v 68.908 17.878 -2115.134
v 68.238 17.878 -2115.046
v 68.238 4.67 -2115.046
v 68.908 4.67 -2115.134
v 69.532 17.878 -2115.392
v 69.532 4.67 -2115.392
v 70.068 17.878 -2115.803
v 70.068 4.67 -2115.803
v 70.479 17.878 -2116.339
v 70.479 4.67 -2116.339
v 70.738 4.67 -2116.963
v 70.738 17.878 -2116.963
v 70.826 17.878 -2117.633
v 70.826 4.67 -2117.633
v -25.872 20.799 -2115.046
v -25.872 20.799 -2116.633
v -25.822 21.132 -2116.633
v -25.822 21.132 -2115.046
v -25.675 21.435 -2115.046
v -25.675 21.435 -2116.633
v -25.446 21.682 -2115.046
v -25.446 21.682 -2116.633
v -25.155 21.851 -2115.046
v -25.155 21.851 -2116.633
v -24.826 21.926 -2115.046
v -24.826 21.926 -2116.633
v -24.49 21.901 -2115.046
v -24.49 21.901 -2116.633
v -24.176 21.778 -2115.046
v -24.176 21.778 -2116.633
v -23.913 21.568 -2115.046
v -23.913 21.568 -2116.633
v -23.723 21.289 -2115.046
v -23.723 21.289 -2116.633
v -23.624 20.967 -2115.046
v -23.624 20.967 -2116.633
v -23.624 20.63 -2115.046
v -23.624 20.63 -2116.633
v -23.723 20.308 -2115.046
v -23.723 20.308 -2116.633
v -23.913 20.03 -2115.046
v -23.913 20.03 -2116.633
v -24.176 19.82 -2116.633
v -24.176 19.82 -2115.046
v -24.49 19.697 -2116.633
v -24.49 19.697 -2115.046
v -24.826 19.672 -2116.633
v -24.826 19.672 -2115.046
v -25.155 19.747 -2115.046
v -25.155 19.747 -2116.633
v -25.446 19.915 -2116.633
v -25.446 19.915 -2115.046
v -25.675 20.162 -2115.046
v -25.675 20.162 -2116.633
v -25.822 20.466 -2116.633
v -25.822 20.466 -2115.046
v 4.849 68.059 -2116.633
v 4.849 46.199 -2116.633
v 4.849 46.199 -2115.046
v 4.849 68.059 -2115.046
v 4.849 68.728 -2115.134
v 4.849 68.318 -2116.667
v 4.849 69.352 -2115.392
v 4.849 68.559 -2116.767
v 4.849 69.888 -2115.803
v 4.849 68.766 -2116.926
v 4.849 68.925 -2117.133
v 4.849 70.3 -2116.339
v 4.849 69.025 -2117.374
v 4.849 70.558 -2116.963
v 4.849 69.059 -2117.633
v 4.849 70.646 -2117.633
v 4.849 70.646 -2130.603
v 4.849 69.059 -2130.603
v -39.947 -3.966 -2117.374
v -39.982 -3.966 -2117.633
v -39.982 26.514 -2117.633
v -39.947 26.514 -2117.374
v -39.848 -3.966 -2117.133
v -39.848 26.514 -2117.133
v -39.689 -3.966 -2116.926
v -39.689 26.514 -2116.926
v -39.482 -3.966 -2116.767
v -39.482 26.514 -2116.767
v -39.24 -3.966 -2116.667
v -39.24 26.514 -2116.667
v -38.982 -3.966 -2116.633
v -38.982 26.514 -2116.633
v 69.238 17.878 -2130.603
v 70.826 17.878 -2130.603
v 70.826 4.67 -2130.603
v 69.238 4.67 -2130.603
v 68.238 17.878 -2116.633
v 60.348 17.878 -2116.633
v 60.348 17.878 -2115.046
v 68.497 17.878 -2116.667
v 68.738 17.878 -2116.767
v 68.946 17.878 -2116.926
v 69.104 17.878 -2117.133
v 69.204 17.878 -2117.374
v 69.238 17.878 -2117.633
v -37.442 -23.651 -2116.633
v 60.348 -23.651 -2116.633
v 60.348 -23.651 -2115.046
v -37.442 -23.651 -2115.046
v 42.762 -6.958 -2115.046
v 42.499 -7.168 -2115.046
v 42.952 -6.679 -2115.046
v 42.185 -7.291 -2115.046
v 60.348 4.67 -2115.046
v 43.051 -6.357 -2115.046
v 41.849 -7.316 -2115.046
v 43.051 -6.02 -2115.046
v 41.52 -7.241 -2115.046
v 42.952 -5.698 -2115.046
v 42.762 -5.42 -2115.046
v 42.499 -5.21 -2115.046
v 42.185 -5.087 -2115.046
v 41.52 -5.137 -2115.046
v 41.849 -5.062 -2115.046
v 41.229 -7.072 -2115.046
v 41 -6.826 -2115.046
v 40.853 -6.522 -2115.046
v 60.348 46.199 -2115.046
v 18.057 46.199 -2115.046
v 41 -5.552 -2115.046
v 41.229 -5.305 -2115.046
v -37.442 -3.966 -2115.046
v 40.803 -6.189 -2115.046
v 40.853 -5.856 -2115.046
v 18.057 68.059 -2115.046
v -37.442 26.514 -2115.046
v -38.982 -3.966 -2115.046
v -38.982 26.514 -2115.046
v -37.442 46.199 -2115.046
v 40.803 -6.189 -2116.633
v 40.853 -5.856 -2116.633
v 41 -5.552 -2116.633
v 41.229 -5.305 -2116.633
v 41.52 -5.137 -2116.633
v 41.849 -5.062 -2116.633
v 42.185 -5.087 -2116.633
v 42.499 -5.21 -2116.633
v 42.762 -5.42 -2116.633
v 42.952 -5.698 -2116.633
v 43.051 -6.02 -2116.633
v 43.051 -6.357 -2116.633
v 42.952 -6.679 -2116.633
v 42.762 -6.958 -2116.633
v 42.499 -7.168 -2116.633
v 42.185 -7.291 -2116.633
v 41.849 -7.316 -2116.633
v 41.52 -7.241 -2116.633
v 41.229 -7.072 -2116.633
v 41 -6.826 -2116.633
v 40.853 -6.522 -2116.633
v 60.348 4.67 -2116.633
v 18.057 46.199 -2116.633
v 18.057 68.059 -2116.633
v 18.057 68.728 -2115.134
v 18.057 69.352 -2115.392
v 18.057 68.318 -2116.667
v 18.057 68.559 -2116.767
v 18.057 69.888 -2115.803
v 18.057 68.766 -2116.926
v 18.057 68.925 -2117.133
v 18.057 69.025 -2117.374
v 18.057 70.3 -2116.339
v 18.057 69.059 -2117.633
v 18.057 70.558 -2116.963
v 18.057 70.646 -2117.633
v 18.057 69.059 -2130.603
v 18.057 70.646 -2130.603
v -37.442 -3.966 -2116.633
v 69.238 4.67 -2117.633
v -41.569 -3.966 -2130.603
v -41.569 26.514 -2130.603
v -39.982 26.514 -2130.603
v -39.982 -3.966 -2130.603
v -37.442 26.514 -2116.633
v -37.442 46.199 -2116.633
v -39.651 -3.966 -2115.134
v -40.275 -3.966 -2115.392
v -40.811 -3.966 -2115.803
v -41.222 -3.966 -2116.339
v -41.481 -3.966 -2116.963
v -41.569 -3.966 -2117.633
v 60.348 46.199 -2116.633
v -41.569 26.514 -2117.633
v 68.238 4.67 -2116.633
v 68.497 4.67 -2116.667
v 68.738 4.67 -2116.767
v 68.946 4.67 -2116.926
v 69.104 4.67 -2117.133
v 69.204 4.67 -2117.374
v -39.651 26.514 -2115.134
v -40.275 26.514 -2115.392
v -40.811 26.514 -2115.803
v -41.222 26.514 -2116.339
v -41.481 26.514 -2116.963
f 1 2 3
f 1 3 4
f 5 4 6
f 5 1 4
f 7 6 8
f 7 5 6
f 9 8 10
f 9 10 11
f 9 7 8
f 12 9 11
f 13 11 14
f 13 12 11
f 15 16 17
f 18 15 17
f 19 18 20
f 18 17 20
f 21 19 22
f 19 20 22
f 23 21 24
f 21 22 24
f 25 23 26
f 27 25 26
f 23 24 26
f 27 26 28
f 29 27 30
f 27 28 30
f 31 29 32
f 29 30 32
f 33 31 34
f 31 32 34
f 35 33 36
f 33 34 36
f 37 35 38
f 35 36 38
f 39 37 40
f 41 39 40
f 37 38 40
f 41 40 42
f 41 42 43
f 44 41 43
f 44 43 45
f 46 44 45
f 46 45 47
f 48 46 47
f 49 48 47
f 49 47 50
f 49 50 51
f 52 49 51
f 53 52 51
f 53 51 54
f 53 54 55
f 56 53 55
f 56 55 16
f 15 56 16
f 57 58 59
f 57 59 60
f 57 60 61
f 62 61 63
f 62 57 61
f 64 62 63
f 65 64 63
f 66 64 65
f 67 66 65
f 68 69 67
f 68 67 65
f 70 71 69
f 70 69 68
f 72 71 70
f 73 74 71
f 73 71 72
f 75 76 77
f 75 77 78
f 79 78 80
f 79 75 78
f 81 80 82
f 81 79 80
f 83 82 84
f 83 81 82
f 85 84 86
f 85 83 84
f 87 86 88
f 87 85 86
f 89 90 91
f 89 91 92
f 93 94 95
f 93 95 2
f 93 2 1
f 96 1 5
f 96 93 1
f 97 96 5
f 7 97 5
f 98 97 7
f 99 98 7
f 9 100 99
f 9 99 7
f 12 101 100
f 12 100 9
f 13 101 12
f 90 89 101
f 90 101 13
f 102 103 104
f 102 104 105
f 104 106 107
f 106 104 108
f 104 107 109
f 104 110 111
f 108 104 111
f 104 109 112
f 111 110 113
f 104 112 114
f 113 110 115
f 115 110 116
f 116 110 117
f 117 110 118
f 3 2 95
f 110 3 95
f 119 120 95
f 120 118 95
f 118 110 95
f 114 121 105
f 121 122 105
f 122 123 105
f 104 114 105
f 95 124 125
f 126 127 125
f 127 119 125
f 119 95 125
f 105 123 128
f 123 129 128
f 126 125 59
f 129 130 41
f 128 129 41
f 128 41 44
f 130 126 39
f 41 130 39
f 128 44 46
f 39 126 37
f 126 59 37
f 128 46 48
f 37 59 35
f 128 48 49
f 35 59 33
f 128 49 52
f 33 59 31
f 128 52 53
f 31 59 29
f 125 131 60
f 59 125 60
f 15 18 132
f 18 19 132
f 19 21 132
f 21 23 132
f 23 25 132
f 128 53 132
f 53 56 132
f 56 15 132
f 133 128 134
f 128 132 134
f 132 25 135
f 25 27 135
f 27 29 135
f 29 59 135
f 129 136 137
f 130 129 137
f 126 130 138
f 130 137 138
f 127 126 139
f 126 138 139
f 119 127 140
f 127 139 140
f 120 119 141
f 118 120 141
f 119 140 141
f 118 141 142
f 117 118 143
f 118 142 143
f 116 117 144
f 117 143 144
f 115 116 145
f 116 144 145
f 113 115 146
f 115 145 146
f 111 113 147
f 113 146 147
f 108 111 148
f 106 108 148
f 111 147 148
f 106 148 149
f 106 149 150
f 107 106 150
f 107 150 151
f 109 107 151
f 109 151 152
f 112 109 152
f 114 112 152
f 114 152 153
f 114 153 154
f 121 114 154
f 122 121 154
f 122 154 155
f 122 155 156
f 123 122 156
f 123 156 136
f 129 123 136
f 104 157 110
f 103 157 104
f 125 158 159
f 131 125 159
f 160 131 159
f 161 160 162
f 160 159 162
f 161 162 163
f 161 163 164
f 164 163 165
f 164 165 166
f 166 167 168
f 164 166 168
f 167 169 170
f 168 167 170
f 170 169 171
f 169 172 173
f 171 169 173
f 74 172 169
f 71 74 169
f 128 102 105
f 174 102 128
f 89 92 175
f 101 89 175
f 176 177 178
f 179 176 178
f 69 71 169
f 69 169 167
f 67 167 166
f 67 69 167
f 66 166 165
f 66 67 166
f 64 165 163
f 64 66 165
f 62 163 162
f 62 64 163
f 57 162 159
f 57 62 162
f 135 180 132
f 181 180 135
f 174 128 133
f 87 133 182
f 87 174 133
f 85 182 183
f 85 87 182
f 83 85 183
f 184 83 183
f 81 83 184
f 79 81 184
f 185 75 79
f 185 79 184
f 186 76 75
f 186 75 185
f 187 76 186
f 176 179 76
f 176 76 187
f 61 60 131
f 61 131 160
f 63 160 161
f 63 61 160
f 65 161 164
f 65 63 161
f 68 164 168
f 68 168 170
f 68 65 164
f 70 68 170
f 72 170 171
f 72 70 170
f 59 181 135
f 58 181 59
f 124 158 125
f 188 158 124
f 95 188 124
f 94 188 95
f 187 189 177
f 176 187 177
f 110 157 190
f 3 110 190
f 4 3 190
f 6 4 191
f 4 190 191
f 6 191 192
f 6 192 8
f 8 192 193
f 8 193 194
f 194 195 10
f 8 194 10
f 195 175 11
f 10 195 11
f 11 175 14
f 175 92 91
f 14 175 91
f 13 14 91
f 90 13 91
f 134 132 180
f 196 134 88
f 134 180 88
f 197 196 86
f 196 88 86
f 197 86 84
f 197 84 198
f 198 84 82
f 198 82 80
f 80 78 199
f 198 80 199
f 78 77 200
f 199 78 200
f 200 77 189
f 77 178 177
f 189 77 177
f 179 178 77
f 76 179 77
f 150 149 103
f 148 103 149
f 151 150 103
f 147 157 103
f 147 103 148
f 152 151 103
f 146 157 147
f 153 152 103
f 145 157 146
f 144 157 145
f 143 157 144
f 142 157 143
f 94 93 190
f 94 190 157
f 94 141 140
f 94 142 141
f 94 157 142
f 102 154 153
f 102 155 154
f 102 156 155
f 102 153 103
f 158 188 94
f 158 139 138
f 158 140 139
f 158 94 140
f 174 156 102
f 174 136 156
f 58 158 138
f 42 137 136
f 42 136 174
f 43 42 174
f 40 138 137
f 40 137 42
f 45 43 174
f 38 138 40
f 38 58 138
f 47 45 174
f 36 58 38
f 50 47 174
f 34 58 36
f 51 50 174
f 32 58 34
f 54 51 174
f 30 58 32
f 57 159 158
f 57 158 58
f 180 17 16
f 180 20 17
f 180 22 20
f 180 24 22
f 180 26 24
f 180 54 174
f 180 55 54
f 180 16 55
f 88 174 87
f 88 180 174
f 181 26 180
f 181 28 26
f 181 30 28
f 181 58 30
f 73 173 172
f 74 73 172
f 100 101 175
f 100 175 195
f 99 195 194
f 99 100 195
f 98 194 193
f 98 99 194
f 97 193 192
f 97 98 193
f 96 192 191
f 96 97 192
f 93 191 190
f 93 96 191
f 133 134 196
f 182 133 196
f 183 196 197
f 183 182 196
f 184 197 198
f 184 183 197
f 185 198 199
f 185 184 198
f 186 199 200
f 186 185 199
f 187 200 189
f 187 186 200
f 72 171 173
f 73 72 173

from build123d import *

# Parameters (mm, degrees)
BASE_FLANGE1_DEPTH             = 1.5875
EDGE_FLANGE1_STRIP_W           = 8.35
EDGE_FLANGE1_STRIP_H           = 1.5875
EDGE_FLANGE1_STRIP_CUT_DEPTH   = 30.48
EDGE_FLANGE1_STRIP_2_W         = 8.35
EDGE_FLANGE1_STRIP_2_H         = 1.5875
EDGE_FLANGE1_STRIP_CUT_2_DEPTH = 13.208
EDGE_FLANGE1_STRIP_3_W         = 8.35
EDGE_FLANGE1_STRIP_3_H         = 1.5875
EDGE_FLANGE1_STRIP_CUT_3_DEPTH = 13.208
EDGE_FLANGE1_DEPTH             = 30.48
EDGE_FLANGE1_BEND_DEPTH        = 13.208
EDGE_FLANGE1_BEND_2_DEPTH      = 13.208
F_4_40_TAPPED_HOLE2_D          = 2.2606
F_4_40_TAPPED_HOLE2_DEPTH      = 7.62
F_4_40_TAPPED_HOLE2_TIP        = 0.679152758


# Sheet-metal steps are written as plain solids
with BuildPart() as part:
    # Sketch4 → Base-Flange1 (new body)
    with BuildSketch(Plane.XY.offset(-2116.63312276)):
        Polygon((69.238438529, 17.87770801), (69.238438529, 4.66970801), (60.348438529, 4.66970801), (60.348438529, -23.65129199), (-37.441561471, -23.65129199), (-37.441561471, -3.96629199), (-39.981561471, -3.96629199), (-39.981561471, 26.51370801), (-37.441561471, 26.51370801), (-37.441561471, 46.19870801), (4.849438529, 46.19870801), (4.849438529, 69.05870801), (18.057438529, 69.05870801), (18.057438529, 46.19870801), (60.348438529, 46.19870801), (60.348438529, 17.87770801), align=None)
    extrude(amount=BASE_FLANGE1_DEPTH)

    # Edge-Flange1 strip (across the edge) → Edge-Flange1 strip cut (cut)
    with BuildSketch(Plane(origin=(-39.981561471, -3.96629199, -2116.63312276), x_dir=(1, 0, 0), z_dir=(0, 1, 0))):
        with Locations((-3.175, -0.79375)):
            Rectangle(EDGE_FLANGE1_STRIP_W, EDGE_FLANGE1_STRIP_H)
    extrude(amount=EDGE_FLANGE1_STRIP_CUT_DEPTH, mode=Mode.SUBTRACT)

    # Edge-Flange1 strip 2 (across the edge) → Edge-Flange1 strip cut 2 (cut)
    with BuildSketch(Plane(origin=(4.849438529, 69.05870801, -2116.63312276), x_dir=(0, -1, 0), z_dir=(1, 0, 0))):
        with Locations((-3.175, -0.79375)):
            Rectangle(EDGE_FLANGE1_STRIP_2_W, EDGE_FLANGE1_STRIP_2_H)
    extrude(amount=EDGE_FLANGE1_STRIP_CUT_2_DEPTH, mode=Mode.SUBTRACT)

    # Edge-Flange1 strip 3 (across the edge) → Edge-Flange1 strip cut 3 (cut)
    with BuildSketch(Plane(origin=(69.238438529, 17.87770801, -2116.63312276), x_dir=(-1, 0, 0), z_dir=(0, -1, 0))):
        with Locations((-3.175, -0.79375)):
            Rectangle(EDGE_FLANGE1_STRIP_3_W, EDGE_FLANGE1_STRIP_3_H)
    extrude(amount=EDGE_FLANGE1_STRIP_CUT_3_DEPTH, mode=Mode.SUBTRACT)

    # Edge-Flange1 section (across the edge) → Edge-Flange1 (add)
    with BuildSketch(Plane(origin=(-39.981561471, -3.96629199, -2116.63312276), x_dir=(1, 0, 0), z_dir=(0, 1, 0))):
        with BuildLine():
            Line((-1.5875, 1), (-1.5875, 13.97))
            Line((-1.5875, 13.97), (0, 13.97))
            Line((0, 13.97), (0, 1))
            ThreePointArc((0, 1), (0.292893219, 0.292893219), (1, 0))
            Line((1, 0), (1, -1.5875))
            ThreePointArc((1, -1.5875), (-0.829638796, -0.829638796), (-1.5875, 1))
        make_face()
    extrude(amount=EDGE_FLANGE1_DEPTH)

    # Edge-Flange1 section 2 (across the edge) → Edge-Flange1 bend (add)
    with BuildSketch(Plane(origin=(4.849438529, 69.05870801, -2116.63312276), x_dir=(0, -1, 0), z_dir=(1, 0, 0))):
        with BuildLine():
            Line((-1.5875, 1), (-1.5875, 13.97))
            Line((-1.5875, 13.97), (0, 13.97))
            Line((0, 13.97), (0, 1))
            ThreePointArc((0, 1), (0.292893219, 0.292893219), (1, 0))
            Line((1, 0), (1, -1.5875))
            ThreePointArc((1, -1.5875), (-0.829638796, -0.829638796), (-1.5875, 1))
        make_face()
    extrude(amount=EDGE_FLANGE1_BEND_DEPTH)

    # Edge-Flange1 section 3 (across the edge) → Edge-Flange1 bend 2 (add)
    with BuildSketch(Plane(origin=(69.238438529, 17.87770801, -2116.63312276), x_dir=(-1, 0, 0), z_dir=(0, -1, 0))):
        with BuildLine():
            Line((-1.5875, 1), (-1.5875, 13.97))
            Line((-1.5875, 13.97), (0, 13.97))
            Line((0, 13.97), (0, 1))
            ThreePointArc((0, 1), (0.292893219, 0.292893219), (1, 0))
            Line((1, 0), (1, -1.5875))
            ThreePointArc((1, -1.5875), (-0.829638796, -0.829638796), (-1.5875, 1))
        make_face()
    extrude(amount=EDGE_FLANGE1_BEND_2_DEPTH)

    # #4-40 Tapped Hole2
    with Locations(Plane(origin=(41.933438529, -6.18879199, -2115.04562276), x_dir=(1, 0, 0), z_dir=(0, 0, 1))):
        with Locations((0, 0), (-66.675, 26.9875)):
            Hole(F_4_40_TAPPED_HOLE2_D / 2, depth=F_4_40_TAPPED_HOLE2_DEPTH)
            with Locations((0, 0, -(F_4_40_TAPPED_HOLE2_DEPTH + F_4_40_TAPPED_HOLE2_TIP / 2))):  # 118° drill point
                Cone(0, F_4_40_TAPPED_HOLE2_D / 2, F_4_40_TAPPED_HOLE2_TIP, mode=Mode.SUBTRACT)


solid = part.part
